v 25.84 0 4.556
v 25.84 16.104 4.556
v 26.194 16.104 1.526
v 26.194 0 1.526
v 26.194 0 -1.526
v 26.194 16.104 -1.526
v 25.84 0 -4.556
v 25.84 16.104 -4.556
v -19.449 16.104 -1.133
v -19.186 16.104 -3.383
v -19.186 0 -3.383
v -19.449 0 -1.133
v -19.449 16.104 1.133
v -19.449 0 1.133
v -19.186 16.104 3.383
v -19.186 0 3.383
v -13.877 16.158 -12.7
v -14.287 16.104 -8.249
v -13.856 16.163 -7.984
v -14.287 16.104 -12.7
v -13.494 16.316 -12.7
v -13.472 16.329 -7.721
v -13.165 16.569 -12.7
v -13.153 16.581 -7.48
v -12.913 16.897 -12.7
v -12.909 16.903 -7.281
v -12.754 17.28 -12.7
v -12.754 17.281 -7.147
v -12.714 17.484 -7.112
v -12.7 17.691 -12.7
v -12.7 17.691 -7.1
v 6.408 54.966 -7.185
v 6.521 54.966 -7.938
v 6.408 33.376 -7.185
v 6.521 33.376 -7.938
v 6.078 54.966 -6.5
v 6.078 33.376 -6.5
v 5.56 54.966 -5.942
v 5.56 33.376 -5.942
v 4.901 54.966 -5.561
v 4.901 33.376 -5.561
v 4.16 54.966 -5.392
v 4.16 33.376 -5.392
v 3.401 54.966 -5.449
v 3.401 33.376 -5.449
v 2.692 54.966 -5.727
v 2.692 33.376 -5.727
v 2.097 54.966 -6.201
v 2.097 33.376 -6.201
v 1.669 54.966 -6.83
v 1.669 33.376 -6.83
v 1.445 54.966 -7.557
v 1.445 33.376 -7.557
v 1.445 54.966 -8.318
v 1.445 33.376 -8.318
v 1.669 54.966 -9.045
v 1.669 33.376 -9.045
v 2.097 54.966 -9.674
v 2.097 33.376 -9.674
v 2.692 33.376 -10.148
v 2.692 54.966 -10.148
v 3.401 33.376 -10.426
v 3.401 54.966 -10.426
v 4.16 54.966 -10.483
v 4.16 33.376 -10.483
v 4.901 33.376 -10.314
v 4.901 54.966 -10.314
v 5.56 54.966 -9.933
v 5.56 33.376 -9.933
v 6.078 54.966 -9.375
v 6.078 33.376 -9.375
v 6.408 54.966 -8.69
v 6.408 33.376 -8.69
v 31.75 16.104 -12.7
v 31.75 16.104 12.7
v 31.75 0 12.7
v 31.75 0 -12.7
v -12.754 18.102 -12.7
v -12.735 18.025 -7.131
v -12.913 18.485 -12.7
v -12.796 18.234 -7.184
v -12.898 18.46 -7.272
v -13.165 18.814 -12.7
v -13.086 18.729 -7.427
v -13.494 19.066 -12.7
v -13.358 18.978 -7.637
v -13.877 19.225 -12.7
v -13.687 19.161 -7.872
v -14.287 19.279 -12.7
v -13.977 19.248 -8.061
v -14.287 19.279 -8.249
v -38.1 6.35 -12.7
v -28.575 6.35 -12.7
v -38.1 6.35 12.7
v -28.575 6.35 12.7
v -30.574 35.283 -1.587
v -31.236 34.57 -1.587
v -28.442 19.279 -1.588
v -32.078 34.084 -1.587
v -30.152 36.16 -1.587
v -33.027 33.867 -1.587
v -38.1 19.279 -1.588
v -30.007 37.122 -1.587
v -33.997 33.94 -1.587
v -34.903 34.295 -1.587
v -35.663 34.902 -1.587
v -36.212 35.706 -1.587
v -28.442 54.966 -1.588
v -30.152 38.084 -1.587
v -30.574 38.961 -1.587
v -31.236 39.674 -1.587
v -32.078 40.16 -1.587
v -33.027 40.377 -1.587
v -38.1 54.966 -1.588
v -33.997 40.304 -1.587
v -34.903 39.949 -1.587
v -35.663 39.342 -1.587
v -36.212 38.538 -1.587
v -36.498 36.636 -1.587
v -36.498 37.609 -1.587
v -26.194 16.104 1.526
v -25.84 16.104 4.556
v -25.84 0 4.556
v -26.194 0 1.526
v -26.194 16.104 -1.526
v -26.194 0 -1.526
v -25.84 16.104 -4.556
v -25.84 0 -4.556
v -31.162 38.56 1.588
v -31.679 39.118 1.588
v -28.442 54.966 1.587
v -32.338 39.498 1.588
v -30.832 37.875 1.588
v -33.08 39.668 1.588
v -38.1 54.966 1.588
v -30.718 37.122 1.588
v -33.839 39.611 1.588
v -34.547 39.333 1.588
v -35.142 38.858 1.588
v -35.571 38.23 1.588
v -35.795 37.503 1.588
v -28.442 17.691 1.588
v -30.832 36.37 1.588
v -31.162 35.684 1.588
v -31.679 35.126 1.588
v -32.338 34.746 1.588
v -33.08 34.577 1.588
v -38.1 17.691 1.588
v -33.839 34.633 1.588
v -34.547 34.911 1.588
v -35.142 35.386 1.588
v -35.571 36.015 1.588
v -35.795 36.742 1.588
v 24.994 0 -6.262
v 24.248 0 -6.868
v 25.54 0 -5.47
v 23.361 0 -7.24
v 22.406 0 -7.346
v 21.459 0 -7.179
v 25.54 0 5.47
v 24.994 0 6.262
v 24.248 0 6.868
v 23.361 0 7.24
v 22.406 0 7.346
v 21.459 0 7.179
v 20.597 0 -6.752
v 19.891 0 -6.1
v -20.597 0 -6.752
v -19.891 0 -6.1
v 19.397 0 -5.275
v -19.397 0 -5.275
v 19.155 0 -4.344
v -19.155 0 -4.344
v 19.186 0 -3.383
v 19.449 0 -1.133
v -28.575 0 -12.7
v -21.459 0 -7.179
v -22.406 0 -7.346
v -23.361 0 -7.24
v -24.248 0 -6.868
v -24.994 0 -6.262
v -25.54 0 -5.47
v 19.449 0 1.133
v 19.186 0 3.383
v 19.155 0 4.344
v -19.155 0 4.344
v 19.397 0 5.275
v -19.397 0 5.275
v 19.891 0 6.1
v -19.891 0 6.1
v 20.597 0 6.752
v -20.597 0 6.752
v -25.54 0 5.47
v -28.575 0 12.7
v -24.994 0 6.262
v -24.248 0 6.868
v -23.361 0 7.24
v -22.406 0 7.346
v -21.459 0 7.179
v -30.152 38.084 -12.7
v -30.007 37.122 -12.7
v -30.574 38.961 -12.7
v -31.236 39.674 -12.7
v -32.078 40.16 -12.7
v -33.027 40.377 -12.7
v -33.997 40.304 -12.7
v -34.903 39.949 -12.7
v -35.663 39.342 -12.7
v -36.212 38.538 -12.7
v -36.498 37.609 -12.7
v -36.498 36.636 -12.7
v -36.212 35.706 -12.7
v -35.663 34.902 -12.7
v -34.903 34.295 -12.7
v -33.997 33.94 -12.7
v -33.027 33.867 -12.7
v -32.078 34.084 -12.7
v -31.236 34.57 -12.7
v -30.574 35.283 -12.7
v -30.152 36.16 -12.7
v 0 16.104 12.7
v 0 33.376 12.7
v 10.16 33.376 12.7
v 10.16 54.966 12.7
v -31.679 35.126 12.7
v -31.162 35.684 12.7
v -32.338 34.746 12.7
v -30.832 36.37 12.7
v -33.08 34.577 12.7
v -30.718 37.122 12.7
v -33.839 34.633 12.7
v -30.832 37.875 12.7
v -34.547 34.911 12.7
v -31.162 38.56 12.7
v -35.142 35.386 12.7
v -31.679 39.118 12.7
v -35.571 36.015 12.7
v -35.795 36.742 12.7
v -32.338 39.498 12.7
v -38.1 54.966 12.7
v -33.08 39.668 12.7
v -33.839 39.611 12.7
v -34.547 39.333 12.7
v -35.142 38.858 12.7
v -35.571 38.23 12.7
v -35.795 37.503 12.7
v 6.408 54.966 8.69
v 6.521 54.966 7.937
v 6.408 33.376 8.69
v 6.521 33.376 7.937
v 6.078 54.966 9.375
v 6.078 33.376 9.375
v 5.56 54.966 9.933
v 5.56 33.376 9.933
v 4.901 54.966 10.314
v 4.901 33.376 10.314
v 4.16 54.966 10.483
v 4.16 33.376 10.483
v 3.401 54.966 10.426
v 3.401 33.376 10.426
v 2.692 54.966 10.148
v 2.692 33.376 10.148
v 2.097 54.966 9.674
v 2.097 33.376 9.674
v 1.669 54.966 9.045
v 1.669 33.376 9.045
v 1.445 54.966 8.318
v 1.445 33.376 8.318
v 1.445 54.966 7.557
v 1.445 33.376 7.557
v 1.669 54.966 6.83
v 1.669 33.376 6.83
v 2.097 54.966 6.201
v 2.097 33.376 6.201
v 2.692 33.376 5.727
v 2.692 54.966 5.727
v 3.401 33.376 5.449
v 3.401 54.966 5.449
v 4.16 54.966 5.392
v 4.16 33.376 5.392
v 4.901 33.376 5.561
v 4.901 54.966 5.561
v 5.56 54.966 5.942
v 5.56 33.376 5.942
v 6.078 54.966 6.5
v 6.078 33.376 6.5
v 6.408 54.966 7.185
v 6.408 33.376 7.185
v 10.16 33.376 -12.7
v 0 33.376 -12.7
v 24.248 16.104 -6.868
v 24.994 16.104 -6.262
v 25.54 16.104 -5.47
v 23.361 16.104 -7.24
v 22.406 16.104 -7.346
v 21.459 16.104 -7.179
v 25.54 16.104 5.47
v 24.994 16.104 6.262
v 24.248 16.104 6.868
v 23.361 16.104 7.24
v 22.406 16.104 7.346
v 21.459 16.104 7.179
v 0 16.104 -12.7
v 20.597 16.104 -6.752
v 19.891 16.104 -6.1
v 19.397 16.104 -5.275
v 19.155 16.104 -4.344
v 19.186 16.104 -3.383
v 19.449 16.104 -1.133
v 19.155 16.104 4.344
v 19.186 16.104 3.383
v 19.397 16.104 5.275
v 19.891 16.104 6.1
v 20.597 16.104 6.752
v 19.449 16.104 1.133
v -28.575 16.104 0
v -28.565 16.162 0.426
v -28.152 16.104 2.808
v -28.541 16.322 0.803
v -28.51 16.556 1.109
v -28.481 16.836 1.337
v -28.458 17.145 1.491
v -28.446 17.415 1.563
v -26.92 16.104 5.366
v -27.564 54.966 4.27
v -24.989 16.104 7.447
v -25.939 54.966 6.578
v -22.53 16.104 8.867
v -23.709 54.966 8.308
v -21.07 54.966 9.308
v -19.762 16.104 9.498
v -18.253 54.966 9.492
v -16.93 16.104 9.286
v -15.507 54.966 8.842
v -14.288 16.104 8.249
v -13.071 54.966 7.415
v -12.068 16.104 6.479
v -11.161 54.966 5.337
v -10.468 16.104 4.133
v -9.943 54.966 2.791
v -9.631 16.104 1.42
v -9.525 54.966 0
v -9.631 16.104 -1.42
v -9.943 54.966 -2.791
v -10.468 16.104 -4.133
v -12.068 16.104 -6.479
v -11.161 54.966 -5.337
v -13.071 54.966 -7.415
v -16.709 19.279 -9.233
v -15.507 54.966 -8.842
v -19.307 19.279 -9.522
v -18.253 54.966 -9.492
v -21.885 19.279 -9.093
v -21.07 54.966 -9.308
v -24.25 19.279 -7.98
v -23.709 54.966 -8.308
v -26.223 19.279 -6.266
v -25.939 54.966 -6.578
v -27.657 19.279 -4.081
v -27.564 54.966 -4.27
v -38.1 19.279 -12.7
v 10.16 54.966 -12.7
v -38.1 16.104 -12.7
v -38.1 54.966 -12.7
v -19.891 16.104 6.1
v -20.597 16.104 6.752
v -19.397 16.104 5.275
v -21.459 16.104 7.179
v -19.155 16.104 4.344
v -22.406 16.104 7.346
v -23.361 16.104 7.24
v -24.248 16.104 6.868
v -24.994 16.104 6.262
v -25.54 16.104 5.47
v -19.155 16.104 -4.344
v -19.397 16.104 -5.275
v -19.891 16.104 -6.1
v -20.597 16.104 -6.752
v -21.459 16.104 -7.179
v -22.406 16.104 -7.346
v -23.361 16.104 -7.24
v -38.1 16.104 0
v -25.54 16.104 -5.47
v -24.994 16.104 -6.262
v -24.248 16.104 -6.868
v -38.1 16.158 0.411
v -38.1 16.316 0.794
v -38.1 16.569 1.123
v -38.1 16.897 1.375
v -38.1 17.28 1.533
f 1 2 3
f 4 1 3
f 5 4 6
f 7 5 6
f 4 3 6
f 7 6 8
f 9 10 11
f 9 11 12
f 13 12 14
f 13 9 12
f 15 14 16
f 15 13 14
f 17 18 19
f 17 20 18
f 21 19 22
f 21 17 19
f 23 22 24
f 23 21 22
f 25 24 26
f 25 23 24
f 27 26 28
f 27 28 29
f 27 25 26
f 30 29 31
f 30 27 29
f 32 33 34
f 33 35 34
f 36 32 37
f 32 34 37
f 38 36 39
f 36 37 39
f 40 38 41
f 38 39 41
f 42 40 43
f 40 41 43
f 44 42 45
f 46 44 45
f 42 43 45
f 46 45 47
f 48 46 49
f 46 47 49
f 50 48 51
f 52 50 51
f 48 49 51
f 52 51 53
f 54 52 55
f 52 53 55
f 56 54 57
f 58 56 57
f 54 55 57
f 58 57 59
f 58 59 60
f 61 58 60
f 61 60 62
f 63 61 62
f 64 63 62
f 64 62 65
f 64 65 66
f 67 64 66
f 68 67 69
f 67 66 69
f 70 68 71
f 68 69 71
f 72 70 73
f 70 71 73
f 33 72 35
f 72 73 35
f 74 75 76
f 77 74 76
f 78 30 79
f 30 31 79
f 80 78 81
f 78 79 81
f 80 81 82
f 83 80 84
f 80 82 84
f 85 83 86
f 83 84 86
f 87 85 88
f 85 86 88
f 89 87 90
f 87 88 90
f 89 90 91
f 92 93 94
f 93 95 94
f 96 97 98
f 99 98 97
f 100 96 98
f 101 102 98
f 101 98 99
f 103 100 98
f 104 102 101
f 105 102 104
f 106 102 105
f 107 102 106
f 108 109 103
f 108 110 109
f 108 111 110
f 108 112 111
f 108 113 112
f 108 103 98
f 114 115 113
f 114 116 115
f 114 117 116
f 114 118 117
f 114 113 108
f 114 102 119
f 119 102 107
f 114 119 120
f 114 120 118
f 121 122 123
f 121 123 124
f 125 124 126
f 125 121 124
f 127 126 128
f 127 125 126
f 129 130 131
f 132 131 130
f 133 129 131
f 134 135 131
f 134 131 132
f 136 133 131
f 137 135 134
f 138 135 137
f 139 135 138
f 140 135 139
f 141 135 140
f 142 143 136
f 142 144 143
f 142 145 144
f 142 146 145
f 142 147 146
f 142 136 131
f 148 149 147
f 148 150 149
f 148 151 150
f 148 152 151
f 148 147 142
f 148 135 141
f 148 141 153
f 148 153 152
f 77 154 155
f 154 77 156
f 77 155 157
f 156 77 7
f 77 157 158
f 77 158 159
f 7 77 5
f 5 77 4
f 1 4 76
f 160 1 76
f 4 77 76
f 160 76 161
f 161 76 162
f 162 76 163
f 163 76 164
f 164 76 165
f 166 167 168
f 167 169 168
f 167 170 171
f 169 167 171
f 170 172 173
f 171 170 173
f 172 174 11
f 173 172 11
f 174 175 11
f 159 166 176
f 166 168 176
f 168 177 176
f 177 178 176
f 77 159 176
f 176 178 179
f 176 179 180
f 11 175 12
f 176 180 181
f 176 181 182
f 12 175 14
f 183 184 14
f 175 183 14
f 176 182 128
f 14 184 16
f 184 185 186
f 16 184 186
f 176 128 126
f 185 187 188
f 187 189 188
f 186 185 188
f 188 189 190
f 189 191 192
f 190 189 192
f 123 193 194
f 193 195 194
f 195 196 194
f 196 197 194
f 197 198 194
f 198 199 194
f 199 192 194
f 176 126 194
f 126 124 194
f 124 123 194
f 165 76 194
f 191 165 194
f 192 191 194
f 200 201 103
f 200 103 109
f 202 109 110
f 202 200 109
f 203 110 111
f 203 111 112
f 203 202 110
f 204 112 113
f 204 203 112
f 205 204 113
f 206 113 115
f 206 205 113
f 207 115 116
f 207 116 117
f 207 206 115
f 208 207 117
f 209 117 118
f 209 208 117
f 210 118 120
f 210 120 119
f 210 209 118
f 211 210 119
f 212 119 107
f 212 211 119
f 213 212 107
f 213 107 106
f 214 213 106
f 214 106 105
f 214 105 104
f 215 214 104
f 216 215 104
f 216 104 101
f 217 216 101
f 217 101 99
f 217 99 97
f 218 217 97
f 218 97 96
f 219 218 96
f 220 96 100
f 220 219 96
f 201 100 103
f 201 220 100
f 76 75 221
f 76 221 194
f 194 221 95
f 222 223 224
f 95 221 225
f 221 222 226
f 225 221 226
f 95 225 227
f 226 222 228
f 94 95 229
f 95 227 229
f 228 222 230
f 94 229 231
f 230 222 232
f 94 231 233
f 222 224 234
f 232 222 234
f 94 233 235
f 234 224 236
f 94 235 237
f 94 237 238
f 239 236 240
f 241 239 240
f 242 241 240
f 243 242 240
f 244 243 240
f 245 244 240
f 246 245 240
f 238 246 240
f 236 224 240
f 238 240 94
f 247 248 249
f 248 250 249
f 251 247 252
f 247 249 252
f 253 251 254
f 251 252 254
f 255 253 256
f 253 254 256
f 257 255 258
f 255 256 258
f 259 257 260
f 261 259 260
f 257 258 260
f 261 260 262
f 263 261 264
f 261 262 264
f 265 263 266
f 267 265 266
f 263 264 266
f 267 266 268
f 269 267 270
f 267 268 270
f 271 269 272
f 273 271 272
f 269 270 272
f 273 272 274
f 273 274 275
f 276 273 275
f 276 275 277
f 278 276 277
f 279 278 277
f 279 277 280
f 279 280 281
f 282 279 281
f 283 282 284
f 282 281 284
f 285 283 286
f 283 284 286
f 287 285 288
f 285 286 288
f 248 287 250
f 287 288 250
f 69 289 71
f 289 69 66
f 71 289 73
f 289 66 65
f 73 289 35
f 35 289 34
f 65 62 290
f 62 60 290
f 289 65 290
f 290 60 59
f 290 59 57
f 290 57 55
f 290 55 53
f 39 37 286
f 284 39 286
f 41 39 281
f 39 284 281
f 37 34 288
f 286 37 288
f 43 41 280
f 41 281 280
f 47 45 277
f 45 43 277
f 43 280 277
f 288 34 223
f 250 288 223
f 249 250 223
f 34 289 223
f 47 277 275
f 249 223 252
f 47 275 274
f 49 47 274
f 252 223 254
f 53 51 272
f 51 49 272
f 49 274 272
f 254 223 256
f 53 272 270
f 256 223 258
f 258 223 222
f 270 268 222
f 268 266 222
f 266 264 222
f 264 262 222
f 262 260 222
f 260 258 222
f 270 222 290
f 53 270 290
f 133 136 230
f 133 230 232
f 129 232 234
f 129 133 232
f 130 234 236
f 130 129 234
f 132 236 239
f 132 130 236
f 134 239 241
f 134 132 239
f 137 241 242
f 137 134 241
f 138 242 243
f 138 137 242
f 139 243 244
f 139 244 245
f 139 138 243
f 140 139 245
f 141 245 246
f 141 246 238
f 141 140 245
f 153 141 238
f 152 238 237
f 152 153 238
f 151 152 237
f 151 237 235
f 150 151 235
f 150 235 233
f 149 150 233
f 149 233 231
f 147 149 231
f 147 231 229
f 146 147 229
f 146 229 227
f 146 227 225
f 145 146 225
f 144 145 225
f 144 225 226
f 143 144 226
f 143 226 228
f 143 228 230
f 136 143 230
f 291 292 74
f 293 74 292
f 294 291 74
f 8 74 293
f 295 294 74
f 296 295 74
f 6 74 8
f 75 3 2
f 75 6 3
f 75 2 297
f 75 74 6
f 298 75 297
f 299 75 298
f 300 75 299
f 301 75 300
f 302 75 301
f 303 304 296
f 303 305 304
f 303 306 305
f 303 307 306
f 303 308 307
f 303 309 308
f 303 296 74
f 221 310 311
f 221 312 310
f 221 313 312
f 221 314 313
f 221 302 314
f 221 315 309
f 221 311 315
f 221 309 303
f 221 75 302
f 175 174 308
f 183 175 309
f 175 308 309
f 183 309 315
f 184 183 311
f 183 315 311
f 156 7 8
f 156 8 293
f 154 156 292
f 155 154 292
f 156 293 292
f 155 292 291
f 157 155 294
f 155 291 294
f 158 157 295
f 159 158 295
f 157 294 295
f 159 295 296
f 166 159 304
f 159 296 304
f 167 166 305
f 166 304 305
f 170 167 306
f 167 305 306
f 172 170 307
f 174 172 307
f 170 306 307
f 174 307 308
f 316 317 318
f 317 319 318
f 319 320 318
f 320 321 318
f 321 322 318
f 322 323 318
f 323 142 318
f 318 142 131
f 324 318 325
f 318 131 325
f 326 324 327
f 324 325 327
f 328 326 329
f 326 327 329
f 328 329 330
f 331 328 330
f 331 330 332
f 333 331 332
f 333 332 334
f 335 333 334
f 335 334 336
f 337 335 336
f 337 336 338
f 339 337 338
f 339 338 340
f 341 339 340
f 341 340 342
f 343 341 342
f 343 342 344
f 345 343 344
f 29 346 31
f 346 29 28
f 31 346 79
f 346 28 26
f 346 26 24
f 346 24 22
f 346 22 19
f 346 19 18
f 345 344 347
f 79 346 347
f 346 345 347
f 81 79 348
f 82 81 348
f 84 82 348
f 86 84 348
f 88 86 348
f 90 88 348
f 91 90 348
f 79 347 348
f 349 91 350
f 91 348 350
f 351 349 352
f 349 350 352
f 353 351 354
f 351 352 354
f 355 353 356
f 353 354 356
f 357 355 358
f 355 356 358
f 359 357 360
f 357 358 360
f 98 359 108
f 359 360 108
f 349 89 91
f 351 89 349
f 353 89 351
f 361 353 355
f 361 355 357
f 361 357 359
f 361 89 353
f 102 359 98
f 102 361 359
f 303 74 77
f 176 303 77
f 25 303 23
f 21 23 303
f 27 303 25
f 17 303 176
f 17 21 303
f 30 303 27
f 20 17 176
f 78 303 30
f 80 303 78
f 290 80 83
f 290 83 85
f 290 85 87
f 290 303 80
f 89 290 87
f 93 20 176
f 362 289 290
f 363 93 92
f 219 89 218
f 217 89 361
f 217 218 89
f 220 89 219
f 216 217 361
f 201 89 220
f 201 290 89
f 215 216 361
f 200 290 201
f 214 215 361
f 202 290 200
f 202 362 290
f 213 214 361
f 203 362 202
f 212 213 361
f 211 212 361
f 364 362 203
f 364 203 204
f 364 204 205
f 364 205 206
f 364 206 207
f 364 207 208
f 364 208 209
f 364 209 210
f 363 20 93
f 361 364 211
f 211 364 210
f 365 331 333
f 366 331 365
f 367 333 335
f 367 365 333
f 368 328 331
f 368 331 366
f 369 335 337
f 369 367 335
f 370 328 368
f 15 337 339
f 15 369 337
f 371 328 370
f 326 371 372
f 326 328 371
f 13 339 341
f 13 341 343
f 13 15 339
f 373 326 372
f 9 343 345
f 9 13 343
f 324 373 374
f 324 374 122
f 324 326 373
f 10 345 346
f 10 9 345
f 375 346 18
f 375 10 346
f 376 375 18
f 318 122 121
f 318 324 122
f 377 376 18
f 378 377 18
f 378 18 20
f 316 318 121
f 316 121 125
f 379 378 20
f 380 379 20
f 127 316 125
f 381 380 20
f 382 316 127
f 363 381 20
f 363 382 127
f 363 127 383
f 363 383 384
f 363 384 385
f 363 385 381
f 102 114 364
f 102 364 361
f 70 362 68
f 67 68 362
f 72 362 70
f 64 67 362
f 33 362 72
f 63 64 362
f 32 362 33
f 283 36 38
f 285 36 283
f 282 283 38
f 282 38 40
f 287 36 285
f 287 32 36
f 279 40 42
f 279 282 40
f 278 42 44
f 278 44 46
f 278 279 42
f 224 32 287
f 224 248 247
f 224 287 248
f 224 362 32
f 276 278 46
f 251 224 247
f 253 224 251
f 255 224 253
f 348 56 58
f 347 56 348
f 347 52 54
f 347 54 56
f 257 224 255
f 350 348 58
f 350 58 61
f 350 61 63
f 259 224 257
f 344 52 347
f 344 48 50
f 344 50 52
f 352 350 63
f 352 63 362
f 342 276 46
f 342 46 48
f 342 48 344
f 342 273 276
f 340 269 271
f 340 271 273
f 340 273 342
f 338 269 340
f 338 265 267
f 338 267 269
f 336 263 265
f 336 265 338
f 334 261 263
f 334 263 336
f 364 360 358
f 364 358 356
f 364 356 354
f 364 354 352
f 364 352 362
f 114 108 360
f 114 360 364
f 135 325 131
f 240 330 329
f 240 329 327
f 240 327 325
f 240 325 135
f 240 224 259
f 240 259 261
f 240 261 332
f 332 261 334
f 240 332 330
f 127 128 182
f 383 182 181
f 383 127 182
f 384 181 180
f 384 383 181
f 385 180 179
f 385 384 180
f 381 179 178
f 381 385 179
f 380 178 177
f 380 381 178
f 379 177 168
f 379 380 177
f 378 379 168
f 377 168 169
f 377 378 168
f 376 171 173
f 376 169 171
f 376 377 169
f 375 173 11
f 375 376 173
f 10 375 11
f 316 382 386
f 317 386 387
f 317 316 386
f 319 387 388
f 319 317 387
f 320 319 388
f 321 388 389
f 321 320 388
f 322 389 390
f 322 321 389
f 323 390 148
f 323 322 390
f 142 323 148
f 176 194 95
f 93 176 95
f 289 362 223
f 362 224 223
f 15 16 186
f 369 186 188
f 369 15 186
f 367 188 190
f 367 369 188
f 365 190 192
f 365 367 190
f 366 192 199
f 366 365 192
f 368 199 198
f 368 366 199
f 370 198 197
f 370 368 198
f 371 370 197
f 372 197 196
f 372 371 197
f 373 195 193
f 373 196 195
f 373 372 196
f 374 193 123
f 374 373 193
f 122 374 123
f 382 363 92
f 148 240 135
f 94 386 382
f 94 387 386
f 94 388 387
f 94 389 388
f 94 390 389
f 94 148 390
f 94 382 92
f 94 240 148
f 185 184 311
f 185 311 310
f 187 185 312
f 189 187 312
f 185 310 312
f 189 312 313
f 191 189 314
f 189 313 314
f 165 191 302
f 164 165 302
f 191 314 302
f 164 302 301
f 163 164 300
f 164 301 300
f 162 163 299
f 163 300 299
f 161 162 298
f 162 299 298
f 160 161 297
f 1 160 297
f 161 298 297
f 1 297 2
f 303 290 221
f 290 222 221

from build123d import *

# Parameters (mm, degrees)
EXTRUDE1_DEPTH              = 12.7
ARC_MOUNTING_SLOT_I_DEPTH   = 56.885195213
CLAMPING_SCREW_HOLES_D      = 5.1054
CLAMPING_SCREW_HOLES_DEPTH  = 21.59
CLAMPING_SCREW_HOLES_TIP    = 1.533816902
SKETCH7_R                   = 9.525
CUT_EXTRUDE1_DEPTH          = 38.862
CUT_EXTRUDE2_DEPTH          = 25.4
ADVANCEDHOLE1_START         = -12.7
ADVANCEDHOLE1_OUTLINE_R     = 2.5527
ADVANCEDHOLE1_DEPTH         = 25.4
ADVANCEDHOLE1_2_OUTLINE_R   = 3.2639
ADVANCEDHOLE1_2_OUTLINE_R_2 = 2.5527
ADVANCEDHOLE1_2_DEPTH       = 11.1125
FILLET1_R                   = 1.5875


# Read off the part's stored shape, not the designer's step: AdvancedHole1
with BuildPart() as part:
    # Sketch1 → Extrude1 (new, symmetric)
    with BuildSketch(Plane.XY):
        Polygon((-28.575, 0), (-28.575, 6.35), (-38.1, 6.35), (-38.1, 16.1036), (-38.1, 54.9656), (-12.7, 54.9656), (10.16, 54.9656), (10.16, 33.3756), (0, 33.3756), (0, 16.1036), (12.7, 16.1036), (31.75, 16.1036), (31.75, 0), align=None)
    extrude(amount=EXTRUDE1_DEPTH, both=True)

    # Sketch2 → Arc mounting slot I (cut, through all)
    with BuildSketch(Plane(origin=(0, 16.1036, 0), x_dir=(-1, 0, 0), z_dir=(0, 1, 0))):
        with BuildLine():
            ThreePointArc((-25.839582785, -4.556215615), (-21.92608696, -7.296474893), (-19.185827683, -3.382979068))
            ThreePointArc((-19.185827683, -3.382979068), (-19.4818, 0), (-19.185827683, 3.382979068))
            ThreePointArc((-19.185827683, 3.382979068), (-21.92608696, 7.296474893), (-25.839582785, 4.556215615))
            ThreePointArc((-25.839582785, 4.556215615), (-26.2382, 0), (-25.839582785, -4.556215615))
        make_face()
    arc_mounting_slot_i = extrude(amount=-ARC_MOUNTING_SLOT_I_DEPTH, mode=Mode.SUBTRACT)

    # Arc mounting slot II: Arc mounting slot I across plane
    add(arc_mounting_slot_i.mirror(Plane(origin=(0, 0, 0), x_dir=(0, 0, 1), z_dir=(1, 0, 0))), mode=Mode.SUBTRACT)

    # Clamping screw holes
    with Locations(Plane(origin=(0, 54.9656, 0), x_dir=(-1, 0, 0), z_dir=(0, 1, 0))):
        with Locations((-3.96875, -7.9375), (-3.96875, 7.9375)):
            Hole(CLAMPING_SCREW_HOLES_D / 2, depth=CLAMPING_SCREW_HOLES_DEPTH)
            with Locations((0, 0, -(CLAMPING_SCREW_HOLES_DEPTH + CLAMPING_SCREW_HOLES_TIP / 2))):  # 118° drill point
                Cone(0, CLAMPING_SCREW_HOLES_D / 2, CLAMPING_SCREW_HOLES_TIP, mode=Mode.SUBTRACT)

    # Sketch7 → Cut-Extrude1 (cut)
    with BuildSketch(Plane(origin=(0, 54.9656, 0), x_dir=(1, 0, 0), z_dir=(0, 1, 0))):
        with Locations(Location((-19.05, 0, 0), (0, 0, 270))):
            Circle(SKETCH7_R)
    extrude(amount=-CUT_EXTRUDE1_DEPTH, mode=Mode.SUBTRACT)

    # Sketch9 → Cut-Extrude2 (cut)
    with BuildSketch(Plane.ZY.offset(38.1)):
        Polygon((-1.5875, 19.2786), (-1.5875, 54.9656), (1.5875, 54.9656), (1.5875, 16.1036), (-12.7, 16.1036), (-12.7, 19.2786), align=None)
    extrude(amount=-CUT_EXTRUDE2_DEPTH, mode=Mode.SUBTRACT)

    # AdvancedHole1 outline → AdvancedHole1 (cut)
    with BuildSketch(Plane.XY.offset(ADVANCEDHOLE1_START)):
        with Locations((-33.270888328, 37.1221)):
            Circle(ADVANCEDHOLE1_OUTLINE_R)
    extrude(amount=ADVANCEDHOLE1_DEPTH, mode=Mode.SUBTRACT)

    # AdvancedHole1 2 outline → AdvancedHole1 2 (cut)
    with BuildSketch(Plane.XY.offset(ADVANCEDHOLE1_START)):
        with Locations((-33.270888328, 37.1221)):
            Circle(ADVANCEDHOLE1_2_OUTLINE_R)
        with Locations((-33.270888328, 37.1221)):
            Circle(ADVANCEDHOLE1_2_OUTLINE_R_2, mode=Mode.SUBTRACT)
    extrude(amount=ADVANCEDHOLE1_2_DEPTH, mode=Mode.SUBTRACT)

    # Fillet1
    fillet1_edges = [part.edges().sort_by_distance(p)[0] for p in [
        (-12.7, 19.2786, -9.899757914),
        (-12.7, 16.1036, -9.899757914),
        (-33.270888328, 16.1036, 1.5875),
    ]]
    fillet(fillet1_edges, radius=FILLET1_R - 0.0001)  # a hair under: the kernel refuses the full size


solid = part.part
